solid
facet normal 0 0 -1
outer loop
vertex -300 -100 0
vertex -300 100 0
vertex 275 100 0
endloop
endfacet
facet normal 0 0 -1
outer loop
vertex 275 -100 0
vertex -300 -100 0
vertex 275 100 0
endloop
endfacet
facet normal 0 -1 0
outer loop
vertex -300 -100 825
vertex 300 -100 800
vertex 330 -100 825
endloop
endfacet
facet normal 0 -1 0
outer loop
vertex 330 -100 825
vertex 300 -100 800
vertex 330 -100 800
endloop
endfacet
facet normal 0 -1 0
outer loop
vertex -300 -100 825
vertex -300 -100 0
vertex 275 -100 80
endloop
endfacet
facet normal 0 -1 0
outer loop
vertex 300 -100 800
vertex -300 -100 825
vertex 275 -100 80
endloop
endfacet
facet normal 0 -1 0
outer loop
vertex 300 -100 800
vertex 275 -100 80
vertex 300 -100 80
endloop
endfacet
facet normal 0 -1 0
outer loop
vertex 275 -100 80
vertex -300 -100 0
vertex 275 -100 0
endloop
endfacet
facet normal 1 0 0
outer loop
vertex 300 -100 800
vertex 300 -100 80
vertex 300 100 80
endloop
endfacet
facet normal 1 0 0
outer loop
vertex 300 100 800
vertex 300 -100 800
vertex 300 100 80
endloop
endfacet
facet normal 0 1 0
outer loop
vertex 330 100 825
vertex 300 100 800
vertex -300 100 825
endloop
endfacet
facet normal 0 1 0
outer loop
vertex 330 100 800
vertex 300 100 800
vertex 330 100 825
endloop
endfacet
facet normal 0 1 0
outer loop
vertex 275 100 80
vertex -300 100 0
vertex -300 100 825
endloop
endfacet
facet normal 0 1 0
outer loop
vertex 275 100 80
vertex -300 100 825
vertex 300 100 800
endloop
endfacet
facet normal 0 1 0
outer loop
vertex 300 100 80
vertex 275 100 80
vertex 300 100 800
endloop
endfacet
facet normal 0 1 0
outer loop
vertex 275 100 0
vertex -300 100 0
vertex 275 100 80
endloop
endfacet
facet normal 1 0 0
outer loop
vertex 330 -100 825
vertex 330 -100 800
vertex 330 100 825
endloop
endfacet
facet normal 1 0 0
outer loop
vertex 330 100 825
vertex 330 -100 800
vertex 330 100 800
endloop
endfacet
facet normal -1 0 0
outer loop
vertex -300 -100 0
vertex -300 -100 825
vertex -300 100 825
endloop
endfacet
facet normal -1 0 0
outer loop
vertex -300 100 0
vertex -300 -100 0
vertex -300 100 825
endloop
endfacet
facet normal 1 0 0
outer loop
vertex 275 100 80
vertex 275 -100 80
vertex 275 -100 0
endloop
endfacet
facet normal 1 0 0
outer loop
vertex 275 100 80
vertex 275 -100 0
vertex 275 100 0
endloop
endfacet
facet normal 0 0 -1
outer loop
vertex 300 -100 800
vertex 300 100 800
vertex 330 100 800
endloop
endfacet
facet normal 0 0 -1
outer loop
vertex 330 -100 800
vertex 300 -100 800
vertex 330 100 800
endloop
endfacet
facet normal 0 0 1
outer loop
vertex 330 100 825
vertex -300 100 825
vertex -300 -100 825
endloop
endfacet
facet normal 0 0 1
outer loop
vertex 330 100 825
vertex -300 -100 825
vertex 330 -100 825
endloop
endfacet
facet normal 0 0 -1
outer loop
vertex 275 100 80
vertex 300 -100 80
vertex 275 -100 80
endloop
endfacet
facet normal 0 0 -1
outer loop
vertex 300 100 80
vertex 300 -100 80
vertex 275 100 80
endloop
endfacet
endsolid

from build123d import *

# Parameters (mm, degrees)
F0_W     = 600
F0_H     = 200
F1_DEPTH = 800
F2_W     = 200
F2_H     = 80
F3_DEPTH = 25
F4_W     = 630
F4_H     = 200
F5_DEPTH = 25


with BuildPart() as f1:
    # F0 (on Top) → F1 (new body)
    with BuildSketch(Plane.XY):
        Rectangle(F0_W, F0_H)
    extrude(amount=F1_DEPTH)

    # F2 (on face) → F3 (cut)
    with BuildSketch(Plane.YZ.offset(300)):
        with Locations((0, 40)):
            Rectangle(F2_W, F2_H)
    extrude(amount=-F3_DEPTH, mode=Mode.SUBTRACT)

    # F4 (on face) → F5 (join)
    with BuildSketch(Plane.XY.offset(800)):
        with Locations((15, 0)):
            Rectangle(F4_W, F4_H)
    extrude(amount=F5_DEPTH)


solid = f1.part
